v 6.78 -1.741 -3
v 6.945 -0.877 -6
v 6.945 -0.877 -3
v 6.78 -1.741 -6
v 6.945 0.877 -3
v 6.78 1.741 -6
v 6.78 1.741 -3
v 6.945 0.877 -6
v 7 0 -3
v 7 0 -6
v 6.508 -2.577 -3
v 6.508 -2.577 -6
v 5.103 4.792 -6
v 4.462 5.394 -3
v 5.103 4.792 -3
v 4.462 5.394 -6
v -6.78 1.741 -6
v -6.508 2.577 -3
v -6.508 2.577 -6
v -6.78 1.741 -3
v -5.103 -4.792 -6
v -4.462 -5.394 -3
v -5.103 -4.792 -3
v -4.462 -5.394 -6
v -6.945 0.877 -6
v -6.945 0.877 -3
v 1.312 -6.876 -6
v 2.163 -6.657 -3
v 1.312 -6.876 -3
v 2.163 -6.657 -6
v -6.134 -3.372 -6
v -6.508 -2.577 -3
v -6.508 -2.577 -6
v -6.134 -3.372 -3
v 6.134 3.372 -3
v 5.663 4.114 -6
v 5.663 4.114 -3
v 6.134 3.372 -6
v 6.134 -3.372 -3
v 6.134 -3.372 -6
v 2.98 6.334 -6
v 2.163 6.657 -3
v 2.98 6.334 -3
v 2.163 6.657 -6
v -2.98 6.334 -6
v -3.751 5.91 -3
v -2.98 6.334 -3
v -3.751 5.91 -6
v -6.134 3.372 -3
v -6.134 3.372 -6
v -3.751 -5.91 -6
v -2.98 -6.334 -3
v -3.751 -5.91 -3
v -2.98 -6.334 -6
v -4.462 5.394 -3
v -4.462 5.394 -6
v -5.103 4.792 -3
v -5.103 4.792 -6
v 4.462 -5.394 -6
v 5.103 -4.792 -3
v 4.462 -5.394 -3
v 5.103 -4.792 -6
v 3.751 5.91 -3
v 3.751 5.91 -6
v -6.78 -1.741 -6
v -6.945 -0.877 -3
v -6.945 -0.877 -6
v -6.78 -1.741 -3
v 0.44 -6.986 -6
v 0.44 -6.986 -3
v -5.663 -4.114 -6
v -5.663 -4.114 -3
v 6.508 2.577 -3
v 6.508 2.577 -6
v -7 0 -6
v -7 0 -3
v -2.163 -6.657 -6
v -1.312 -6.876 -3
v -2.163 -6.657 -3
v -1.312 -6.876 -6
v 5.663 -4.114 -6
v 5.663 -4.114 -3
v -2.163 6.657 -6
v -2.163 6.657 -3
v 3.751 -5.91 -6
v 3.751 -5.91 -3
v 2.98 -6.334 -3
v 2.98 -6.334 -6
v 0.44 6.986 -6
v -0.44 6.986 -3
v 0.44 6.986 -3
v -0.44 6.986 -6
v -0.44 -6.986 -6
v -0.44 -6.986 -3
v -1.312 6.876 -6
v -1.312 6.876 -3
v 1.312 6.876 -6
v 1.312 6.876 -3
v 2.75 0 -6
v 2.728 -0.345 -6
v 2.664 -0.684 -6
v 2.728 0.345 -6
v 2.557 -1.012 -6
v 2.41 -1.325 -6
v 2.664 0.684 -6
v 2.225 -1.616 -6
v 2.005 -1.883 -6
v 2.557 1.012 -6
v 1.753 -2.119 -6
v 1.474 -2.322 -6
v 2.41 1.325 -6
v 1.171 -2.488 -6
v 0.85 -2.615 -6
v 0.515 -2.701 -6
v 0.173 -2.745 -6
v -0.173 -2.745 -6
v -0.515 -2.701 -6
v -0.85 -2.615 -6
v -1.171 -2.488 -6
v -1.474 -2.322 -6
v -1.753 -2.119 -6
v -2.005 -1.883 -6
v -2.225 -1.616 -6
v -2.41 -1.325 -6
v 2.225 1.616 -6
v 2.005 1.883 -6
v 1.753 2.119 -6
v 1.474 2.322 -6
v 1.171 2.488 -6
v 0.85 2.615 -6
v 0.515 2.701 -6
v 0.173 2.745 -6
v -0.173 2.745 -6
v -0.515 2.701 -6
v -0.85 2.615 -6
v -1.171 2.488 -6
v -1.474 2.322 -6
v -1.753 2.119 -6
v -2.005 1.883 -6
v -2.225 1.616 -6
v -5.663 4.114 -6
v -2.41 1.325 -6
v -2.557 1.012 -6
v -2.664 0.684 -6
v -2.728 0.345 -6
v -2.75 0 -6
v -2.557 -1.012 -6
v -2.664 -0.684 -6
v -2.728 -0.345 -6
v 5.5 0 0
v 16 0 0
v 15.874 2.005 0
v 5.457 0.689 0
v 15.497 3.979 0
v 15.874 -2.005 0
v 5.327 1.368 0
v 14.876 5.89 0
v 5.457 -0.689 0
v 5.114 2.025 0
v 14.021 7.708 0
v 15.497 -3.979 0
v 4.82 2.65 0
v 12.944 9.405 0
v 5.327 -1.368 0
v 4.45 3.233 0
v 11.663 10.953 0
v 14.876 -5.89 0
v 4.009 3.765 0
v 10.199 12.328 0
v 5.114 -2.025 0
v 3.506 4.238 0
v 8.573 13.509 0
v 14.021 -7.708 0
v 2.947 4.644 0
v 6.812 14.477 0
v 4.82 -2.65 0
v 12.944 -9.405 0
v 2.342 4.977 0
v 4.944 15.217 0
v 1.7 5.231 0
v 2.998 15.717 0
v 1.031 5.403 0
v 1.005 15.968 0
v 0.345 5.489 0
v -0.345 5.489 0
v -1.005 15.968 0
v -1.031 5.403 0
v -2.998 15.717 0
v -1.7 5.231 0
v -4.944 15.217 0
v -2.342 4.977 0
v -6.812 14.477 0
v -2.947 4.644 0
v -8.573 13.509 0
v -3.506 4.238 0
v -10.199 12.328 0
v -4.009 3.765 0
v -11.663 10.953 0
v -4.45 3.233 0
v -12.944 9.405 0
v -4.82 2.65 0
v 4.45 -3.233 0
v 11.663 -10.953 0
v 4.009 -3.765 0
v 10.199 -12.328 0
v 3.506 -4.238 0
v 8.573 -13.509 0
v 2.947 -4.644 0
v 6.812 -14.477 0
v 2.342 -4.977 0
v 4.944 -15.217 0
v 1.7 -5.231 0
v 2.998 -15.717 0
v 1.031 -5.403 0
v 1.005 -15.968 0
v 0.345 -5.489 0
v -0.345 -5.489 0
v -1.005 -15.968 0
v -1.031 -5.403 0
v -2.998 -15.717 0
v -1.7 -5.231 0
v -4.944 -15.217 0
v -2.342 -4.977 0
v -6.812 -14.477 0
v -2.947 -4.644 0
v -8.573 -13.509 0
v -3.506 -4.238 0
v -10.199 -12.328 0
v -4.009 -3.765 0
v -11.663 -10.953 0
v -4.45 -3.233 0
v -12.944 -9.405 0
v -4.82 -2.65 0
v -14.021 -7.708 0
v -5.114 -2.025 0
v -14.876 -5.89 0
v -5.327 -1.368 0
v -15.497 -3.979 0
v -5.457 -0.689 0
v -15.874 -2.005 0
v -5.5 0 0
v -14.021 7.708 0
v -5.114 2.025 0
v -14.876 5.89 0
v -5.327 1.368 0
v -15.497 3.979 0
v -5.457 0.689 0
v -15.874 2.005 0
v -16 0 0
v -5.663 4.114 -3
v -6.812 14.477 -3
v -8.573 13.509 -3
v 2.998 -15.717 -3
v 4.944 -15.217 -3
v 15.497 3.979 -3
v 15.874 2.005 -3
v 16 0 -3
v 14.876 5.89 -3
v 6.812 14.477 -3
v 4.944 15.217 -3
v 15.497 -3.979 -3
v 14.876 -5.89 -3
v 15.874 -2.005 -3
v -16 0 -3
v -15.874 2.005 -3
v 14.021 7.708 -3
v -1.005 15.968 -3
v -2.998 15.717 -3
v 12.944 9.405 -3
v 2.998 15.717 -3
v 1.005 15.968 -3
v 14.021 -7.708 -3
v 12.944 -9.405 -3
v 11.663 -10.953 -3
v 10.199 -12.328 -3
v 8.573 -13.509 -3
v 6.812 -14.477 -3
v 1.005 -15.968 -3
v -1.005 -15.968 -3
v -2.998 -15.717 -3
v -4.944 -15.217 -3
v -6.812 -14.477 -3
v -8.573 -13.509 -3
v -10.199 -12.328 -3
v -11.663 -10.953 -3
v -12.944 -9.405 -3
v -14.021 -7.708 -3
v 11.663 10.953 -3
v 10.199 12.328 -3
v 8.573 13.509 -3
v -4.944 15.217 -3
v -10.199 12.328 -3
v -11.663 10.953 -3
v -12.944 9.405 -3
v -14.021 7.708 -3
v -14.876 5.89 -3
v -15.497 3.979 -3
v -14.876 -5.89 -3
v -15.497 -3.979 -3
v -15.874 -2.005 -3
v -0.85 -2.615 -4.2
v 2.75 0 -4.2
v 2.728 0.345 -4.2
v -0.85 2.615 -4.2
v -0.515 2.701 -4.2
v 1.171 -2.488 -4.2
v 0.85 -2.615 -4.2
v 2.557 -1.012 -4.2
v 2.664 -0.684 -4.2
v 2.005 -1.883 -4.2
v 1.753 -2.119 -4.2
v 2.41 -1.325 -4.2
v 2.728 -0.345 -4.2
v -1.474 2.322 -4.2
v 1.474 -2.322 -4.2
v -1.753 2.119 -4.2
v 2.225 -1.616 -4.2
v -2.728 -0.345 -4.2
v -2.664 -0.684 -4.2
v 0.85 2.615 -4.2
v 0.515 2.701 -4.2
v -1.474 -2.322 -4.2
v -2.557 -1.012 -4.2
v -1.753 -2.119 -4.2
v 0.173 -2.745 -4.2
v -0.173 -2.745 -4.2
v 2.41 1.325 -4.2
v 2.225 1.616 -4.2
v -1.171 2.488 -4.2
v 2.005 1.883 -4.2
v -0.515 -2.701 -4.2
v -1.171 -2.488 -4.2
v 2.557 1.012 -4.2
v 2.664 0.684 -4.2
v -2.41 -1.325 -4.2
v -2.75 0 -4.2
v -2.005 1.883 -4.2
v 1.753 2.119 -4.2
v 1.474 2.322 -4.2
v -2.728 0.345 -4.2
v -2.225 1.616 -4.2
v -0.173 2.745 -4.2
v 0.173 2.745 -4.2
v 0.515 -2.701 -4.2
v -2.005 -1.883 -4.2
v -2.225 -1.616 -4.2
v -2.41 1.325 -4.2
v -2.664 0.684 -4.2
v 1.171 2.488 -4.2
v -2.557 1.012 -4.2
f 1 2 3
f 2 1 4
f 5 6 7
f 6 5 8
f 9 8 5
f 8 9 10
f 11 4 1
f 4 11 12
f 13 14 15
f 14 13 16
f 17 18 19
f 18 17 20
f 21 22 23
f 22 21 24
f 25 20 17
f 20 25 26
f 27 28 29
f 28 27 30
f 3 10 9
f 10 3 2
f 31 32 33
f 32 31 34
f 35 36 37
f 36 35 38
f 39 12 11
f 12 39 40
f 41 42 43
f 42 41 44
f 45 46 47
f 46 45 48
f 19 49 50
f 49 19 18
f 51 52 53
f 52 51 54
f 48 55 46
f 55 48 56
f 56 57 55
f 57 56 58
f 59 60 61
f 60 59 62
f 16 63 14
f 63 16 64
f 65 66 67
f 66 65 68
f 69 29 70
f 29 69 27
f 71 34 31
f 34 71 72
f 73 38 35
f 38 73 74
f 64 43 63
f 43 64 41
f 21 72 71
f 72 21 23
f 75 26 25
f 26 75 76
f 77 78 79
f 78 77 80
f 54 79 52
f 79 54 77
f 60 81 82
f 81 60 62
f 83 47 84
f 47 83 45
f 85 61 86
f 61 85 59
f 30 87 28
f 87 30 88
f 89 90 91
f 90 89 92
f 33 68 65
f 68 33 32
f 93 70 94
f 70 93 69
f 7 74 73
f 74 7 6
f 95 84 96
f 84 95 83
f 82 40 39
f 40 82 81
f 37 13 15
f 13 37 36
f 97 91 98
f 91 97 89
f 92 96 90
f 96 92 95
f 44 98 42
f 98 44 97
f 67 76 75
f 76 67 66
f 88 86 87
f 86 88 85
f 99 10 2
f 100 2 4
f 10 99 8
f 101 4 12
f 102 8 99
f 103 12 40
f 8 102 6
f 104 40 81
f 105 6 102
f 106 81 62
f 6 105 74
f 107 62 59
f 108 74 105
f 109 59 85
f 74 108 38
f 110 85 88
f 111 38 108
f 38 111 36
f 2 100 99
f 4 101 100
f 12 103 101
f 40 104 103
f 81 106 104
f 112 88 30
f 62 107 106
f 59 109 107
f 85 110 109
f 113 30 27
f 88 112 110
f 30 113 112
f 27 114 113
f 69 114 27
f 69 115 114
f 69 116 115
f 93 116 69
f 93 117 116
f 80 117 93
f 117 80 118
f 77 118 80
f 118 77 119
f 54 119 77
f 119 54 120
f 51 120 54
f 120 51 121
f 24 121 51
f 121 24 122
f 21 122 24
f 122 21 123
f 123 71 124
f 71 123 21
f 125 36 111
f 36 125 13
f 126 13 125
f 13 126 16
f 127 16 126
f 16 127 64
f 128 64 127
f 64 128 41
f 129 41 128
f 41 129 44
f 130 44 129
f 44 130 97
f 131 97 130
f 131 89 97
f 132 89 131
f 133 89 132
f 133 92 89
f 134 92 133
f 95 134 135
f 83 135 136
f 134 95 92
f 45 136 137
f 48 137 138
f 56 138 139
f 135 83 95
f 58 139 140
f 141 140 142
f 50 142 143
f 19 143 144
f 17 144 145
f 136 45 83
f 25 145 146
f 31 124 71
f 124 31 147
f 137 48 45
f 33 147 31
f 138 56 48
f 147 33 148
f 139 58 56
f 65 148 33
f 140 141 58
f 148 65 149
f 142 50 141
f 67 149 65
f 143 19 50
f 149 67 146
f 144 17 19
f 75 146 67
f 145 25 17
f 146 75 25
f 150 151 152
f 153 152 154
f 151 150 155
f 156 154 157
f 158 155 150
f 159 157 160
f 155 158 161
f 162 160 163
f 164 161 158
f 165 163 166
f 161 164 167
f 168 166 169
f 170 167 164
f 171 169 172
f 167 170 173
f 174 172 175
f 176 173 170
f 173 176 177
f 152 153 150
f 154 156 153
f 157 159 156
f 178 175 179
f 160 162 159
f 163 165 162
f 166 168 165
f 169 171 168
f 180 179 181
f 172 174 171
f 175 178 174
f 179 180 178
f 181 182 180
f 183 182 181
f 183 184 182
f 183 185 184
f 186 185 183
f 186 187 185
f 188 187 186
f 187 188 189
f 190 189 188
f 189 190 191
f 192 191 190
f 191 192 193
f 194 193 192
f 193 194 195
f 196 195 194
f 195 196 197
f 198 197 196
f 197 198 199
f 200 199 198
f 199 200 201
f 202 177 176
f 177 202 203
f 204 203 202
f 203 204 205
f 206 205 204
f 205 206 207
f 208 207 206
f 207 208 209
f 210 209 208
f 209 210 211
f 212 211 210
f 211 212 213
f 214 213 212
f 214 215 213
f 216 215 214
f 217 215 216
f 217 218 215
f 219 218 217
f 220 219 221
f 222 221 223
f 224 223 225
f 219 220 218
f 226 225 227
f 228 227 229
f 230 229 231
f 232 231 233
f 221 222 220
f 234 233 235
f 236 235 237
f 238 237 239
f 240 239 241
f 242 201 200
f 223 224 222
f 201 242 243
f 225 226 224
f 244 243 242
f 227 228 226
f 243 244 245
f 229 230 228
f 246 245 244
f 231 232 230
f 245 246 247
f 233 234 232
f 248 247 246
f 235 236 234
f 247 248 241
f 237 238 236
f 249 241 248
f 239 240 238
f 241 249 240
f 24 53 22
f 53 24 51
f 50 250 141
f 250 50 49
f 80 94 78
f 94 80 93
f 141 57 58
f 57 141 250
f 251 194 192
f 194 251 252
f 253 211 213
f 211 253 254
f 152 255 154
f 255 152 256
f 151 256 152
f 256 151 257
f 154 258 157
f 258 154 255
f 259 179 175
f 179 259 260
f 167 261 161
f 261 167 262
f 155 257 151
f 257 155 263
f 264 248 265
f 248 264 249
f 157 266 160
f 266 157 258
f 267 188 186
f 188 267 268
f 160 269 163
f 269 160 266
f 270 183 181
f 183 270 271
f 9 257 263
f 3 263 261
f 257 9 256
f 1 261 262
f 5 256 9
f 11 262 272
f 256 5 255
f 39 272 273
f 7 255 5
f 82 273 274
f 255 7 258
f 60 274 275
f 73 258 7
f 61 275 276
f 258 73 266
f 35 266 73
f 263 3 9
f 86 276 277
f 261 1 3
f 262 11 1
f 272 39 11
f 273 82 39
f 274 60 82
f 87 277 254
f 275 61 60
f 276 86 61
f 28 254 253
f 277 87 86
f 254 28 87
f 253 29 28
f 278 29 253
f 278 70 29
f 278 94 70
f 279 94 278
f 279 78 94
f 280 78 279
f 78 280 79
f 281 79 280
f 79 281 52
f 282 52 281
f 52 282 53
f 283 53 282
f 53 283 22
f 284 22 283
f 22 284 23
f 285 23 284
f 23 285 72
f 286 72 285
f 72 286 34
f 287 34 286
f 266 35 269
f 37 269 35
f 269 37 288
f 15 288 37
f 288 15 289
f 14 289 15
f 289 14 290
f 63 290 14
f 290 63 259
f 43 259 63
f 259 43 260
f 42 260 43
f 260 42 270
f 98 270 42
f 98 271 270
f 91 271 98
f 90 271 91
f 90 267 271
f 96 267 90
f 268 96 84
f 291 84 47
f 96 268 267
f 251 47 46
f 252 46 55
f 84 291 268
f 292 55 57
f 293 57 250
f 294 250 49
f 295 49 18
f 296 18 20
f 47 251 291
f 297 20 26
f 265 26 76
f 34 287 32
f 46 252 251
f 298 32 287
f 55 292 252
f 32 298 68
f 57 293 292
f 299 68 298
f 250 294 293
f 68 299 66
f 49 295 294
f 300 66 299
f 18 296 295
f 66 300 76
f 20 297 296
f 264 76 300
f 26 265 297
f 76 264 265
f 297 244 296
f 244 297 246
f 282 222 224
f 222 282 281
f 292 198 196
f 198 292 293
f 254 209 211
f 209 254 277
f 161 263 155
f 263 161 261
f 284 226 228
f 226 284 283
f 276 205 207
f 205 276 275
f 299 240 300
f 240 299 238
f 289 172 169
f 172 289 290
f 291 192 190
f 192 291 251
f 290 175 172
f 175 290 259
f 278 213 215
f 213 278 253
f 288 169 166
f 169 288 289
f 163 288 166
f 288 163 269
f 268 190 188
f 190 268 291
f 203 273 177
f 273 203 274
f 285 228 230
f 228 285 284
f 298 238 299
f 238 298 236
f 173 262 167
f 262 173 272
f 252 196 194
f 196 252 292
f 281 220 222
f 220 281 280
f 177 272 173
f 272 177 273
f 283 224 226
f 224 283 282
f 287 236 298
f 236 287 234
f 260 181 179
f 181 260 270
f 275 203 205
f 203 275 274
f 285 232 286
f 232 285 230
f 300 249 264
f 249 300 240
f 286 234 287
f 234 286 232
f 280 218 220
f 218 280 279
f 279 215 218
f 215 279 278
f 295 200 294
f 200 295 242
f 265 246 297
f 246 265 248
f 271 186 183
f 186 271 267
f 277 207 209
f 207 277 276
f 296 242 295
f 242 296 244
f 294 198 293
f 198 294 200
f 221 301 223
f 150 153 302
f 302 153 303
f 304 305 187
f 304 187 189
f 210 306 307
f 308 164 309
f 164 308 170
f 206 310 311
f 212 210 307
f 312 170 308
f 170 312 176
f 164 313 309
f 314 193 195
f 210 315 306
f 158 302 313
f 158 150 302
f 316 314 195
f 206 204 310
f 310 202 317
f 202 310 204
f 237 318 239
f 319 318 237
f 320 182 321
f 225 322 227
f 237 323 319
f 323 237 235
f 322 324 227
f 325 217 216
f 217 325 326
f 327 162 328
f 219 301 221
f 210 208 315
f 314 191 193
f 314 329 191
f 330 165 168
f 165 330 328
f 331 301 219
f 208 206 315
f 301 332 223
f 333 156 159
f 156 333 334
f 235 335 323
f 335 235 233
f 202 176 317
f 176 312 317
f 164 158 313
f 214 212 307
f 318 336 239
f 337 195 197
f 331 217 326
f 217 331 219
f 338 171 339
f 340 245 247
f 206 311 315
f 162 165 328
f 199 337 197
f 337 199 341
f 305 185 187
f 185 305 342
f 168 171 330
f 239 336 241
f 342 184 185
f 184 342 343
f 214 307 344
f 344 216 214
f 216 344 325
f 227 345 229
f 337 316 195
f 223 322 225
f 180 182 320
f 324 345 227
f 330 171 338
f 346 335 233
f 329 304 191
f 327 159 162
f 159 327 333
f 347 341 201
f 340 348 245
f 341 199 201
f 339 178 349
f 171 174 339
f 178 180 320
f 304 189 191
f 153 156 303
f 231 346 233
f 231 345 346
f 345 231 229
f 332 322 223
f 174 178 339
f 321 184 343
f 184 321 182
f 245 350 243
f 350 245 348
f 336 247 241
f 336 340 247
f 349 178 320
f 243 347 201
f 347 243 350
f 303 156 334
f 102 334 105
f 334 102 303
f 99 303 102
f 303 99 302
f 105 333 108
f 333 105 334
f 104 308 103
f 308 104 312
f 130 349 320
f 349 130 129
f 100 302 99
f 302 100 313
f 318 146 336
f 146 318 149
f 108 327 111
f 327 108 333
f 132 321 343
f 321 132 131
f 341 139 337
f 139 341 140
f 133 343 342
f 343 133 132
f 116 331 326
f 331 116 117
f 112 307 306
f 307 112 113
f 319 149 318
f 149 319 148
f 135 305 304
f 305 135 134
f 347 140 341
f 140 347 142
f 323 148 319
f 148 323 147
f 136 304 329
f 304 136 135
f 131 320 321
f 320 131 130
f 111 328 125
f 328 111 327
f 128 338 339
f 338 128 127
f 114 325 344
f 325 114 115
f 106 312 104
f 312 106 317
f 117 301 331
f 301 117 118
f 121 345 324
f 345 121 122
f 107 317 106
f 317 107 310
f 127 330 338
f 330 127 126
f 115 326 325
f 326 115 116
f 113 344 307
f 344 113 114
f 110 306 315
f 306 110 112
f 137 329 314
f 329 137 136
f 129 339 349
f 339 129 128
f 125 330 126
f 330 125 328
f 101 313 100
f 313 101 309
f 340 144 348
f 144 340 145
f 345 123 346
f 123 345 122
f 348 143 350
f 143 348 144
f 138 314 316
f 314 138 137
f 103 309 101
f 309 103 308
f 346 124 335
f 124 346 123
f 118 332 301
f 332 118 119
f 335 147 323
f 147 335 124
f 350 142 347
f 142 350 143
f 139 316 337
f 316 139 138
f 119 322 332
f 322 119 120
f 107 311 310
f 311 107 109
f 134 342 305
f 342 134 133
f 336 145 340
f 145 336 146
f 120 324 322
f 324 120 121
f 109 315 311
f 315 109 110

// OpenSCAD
$fn = 50;


difference() {
	union() {
		translate(v = [0, 0, -6.0000000000]) {
			cylinder(h = 6, r = 7.0000000000);
		}
		translate(v = [0, 0, -3.0000000000]) {
			cylinder(h = 3, r = 16.0000000000);
		}
	}
	union() {
		translate(v = [0, 0, 0]) {
			rotate(a = [0, 0, 0]) {
				difference() {
					union() {
						#translate(v = [0, 0, -6.0000000000]) {
							cylinder(h = 6, r = 2.2500000000);
						}
						#translate(v = [0, 0, -4.2000000000]) {
							cylinder(h = 4.2000000000, r = 7.0000000000, r1 = 2.7500000000, r2 = 5.5000000000);
						}
						#translate(v = [0, 0, -6.0000000000]) {
							cylinder(h = 6, r = 2.7500000000);
						}
						#translate(v = [0, 0, -6.0000000000]) {
							cylinder(h = 6, r = 2.2500000000);
						}
					}
					union();
				}
			}
		}
	}
}
